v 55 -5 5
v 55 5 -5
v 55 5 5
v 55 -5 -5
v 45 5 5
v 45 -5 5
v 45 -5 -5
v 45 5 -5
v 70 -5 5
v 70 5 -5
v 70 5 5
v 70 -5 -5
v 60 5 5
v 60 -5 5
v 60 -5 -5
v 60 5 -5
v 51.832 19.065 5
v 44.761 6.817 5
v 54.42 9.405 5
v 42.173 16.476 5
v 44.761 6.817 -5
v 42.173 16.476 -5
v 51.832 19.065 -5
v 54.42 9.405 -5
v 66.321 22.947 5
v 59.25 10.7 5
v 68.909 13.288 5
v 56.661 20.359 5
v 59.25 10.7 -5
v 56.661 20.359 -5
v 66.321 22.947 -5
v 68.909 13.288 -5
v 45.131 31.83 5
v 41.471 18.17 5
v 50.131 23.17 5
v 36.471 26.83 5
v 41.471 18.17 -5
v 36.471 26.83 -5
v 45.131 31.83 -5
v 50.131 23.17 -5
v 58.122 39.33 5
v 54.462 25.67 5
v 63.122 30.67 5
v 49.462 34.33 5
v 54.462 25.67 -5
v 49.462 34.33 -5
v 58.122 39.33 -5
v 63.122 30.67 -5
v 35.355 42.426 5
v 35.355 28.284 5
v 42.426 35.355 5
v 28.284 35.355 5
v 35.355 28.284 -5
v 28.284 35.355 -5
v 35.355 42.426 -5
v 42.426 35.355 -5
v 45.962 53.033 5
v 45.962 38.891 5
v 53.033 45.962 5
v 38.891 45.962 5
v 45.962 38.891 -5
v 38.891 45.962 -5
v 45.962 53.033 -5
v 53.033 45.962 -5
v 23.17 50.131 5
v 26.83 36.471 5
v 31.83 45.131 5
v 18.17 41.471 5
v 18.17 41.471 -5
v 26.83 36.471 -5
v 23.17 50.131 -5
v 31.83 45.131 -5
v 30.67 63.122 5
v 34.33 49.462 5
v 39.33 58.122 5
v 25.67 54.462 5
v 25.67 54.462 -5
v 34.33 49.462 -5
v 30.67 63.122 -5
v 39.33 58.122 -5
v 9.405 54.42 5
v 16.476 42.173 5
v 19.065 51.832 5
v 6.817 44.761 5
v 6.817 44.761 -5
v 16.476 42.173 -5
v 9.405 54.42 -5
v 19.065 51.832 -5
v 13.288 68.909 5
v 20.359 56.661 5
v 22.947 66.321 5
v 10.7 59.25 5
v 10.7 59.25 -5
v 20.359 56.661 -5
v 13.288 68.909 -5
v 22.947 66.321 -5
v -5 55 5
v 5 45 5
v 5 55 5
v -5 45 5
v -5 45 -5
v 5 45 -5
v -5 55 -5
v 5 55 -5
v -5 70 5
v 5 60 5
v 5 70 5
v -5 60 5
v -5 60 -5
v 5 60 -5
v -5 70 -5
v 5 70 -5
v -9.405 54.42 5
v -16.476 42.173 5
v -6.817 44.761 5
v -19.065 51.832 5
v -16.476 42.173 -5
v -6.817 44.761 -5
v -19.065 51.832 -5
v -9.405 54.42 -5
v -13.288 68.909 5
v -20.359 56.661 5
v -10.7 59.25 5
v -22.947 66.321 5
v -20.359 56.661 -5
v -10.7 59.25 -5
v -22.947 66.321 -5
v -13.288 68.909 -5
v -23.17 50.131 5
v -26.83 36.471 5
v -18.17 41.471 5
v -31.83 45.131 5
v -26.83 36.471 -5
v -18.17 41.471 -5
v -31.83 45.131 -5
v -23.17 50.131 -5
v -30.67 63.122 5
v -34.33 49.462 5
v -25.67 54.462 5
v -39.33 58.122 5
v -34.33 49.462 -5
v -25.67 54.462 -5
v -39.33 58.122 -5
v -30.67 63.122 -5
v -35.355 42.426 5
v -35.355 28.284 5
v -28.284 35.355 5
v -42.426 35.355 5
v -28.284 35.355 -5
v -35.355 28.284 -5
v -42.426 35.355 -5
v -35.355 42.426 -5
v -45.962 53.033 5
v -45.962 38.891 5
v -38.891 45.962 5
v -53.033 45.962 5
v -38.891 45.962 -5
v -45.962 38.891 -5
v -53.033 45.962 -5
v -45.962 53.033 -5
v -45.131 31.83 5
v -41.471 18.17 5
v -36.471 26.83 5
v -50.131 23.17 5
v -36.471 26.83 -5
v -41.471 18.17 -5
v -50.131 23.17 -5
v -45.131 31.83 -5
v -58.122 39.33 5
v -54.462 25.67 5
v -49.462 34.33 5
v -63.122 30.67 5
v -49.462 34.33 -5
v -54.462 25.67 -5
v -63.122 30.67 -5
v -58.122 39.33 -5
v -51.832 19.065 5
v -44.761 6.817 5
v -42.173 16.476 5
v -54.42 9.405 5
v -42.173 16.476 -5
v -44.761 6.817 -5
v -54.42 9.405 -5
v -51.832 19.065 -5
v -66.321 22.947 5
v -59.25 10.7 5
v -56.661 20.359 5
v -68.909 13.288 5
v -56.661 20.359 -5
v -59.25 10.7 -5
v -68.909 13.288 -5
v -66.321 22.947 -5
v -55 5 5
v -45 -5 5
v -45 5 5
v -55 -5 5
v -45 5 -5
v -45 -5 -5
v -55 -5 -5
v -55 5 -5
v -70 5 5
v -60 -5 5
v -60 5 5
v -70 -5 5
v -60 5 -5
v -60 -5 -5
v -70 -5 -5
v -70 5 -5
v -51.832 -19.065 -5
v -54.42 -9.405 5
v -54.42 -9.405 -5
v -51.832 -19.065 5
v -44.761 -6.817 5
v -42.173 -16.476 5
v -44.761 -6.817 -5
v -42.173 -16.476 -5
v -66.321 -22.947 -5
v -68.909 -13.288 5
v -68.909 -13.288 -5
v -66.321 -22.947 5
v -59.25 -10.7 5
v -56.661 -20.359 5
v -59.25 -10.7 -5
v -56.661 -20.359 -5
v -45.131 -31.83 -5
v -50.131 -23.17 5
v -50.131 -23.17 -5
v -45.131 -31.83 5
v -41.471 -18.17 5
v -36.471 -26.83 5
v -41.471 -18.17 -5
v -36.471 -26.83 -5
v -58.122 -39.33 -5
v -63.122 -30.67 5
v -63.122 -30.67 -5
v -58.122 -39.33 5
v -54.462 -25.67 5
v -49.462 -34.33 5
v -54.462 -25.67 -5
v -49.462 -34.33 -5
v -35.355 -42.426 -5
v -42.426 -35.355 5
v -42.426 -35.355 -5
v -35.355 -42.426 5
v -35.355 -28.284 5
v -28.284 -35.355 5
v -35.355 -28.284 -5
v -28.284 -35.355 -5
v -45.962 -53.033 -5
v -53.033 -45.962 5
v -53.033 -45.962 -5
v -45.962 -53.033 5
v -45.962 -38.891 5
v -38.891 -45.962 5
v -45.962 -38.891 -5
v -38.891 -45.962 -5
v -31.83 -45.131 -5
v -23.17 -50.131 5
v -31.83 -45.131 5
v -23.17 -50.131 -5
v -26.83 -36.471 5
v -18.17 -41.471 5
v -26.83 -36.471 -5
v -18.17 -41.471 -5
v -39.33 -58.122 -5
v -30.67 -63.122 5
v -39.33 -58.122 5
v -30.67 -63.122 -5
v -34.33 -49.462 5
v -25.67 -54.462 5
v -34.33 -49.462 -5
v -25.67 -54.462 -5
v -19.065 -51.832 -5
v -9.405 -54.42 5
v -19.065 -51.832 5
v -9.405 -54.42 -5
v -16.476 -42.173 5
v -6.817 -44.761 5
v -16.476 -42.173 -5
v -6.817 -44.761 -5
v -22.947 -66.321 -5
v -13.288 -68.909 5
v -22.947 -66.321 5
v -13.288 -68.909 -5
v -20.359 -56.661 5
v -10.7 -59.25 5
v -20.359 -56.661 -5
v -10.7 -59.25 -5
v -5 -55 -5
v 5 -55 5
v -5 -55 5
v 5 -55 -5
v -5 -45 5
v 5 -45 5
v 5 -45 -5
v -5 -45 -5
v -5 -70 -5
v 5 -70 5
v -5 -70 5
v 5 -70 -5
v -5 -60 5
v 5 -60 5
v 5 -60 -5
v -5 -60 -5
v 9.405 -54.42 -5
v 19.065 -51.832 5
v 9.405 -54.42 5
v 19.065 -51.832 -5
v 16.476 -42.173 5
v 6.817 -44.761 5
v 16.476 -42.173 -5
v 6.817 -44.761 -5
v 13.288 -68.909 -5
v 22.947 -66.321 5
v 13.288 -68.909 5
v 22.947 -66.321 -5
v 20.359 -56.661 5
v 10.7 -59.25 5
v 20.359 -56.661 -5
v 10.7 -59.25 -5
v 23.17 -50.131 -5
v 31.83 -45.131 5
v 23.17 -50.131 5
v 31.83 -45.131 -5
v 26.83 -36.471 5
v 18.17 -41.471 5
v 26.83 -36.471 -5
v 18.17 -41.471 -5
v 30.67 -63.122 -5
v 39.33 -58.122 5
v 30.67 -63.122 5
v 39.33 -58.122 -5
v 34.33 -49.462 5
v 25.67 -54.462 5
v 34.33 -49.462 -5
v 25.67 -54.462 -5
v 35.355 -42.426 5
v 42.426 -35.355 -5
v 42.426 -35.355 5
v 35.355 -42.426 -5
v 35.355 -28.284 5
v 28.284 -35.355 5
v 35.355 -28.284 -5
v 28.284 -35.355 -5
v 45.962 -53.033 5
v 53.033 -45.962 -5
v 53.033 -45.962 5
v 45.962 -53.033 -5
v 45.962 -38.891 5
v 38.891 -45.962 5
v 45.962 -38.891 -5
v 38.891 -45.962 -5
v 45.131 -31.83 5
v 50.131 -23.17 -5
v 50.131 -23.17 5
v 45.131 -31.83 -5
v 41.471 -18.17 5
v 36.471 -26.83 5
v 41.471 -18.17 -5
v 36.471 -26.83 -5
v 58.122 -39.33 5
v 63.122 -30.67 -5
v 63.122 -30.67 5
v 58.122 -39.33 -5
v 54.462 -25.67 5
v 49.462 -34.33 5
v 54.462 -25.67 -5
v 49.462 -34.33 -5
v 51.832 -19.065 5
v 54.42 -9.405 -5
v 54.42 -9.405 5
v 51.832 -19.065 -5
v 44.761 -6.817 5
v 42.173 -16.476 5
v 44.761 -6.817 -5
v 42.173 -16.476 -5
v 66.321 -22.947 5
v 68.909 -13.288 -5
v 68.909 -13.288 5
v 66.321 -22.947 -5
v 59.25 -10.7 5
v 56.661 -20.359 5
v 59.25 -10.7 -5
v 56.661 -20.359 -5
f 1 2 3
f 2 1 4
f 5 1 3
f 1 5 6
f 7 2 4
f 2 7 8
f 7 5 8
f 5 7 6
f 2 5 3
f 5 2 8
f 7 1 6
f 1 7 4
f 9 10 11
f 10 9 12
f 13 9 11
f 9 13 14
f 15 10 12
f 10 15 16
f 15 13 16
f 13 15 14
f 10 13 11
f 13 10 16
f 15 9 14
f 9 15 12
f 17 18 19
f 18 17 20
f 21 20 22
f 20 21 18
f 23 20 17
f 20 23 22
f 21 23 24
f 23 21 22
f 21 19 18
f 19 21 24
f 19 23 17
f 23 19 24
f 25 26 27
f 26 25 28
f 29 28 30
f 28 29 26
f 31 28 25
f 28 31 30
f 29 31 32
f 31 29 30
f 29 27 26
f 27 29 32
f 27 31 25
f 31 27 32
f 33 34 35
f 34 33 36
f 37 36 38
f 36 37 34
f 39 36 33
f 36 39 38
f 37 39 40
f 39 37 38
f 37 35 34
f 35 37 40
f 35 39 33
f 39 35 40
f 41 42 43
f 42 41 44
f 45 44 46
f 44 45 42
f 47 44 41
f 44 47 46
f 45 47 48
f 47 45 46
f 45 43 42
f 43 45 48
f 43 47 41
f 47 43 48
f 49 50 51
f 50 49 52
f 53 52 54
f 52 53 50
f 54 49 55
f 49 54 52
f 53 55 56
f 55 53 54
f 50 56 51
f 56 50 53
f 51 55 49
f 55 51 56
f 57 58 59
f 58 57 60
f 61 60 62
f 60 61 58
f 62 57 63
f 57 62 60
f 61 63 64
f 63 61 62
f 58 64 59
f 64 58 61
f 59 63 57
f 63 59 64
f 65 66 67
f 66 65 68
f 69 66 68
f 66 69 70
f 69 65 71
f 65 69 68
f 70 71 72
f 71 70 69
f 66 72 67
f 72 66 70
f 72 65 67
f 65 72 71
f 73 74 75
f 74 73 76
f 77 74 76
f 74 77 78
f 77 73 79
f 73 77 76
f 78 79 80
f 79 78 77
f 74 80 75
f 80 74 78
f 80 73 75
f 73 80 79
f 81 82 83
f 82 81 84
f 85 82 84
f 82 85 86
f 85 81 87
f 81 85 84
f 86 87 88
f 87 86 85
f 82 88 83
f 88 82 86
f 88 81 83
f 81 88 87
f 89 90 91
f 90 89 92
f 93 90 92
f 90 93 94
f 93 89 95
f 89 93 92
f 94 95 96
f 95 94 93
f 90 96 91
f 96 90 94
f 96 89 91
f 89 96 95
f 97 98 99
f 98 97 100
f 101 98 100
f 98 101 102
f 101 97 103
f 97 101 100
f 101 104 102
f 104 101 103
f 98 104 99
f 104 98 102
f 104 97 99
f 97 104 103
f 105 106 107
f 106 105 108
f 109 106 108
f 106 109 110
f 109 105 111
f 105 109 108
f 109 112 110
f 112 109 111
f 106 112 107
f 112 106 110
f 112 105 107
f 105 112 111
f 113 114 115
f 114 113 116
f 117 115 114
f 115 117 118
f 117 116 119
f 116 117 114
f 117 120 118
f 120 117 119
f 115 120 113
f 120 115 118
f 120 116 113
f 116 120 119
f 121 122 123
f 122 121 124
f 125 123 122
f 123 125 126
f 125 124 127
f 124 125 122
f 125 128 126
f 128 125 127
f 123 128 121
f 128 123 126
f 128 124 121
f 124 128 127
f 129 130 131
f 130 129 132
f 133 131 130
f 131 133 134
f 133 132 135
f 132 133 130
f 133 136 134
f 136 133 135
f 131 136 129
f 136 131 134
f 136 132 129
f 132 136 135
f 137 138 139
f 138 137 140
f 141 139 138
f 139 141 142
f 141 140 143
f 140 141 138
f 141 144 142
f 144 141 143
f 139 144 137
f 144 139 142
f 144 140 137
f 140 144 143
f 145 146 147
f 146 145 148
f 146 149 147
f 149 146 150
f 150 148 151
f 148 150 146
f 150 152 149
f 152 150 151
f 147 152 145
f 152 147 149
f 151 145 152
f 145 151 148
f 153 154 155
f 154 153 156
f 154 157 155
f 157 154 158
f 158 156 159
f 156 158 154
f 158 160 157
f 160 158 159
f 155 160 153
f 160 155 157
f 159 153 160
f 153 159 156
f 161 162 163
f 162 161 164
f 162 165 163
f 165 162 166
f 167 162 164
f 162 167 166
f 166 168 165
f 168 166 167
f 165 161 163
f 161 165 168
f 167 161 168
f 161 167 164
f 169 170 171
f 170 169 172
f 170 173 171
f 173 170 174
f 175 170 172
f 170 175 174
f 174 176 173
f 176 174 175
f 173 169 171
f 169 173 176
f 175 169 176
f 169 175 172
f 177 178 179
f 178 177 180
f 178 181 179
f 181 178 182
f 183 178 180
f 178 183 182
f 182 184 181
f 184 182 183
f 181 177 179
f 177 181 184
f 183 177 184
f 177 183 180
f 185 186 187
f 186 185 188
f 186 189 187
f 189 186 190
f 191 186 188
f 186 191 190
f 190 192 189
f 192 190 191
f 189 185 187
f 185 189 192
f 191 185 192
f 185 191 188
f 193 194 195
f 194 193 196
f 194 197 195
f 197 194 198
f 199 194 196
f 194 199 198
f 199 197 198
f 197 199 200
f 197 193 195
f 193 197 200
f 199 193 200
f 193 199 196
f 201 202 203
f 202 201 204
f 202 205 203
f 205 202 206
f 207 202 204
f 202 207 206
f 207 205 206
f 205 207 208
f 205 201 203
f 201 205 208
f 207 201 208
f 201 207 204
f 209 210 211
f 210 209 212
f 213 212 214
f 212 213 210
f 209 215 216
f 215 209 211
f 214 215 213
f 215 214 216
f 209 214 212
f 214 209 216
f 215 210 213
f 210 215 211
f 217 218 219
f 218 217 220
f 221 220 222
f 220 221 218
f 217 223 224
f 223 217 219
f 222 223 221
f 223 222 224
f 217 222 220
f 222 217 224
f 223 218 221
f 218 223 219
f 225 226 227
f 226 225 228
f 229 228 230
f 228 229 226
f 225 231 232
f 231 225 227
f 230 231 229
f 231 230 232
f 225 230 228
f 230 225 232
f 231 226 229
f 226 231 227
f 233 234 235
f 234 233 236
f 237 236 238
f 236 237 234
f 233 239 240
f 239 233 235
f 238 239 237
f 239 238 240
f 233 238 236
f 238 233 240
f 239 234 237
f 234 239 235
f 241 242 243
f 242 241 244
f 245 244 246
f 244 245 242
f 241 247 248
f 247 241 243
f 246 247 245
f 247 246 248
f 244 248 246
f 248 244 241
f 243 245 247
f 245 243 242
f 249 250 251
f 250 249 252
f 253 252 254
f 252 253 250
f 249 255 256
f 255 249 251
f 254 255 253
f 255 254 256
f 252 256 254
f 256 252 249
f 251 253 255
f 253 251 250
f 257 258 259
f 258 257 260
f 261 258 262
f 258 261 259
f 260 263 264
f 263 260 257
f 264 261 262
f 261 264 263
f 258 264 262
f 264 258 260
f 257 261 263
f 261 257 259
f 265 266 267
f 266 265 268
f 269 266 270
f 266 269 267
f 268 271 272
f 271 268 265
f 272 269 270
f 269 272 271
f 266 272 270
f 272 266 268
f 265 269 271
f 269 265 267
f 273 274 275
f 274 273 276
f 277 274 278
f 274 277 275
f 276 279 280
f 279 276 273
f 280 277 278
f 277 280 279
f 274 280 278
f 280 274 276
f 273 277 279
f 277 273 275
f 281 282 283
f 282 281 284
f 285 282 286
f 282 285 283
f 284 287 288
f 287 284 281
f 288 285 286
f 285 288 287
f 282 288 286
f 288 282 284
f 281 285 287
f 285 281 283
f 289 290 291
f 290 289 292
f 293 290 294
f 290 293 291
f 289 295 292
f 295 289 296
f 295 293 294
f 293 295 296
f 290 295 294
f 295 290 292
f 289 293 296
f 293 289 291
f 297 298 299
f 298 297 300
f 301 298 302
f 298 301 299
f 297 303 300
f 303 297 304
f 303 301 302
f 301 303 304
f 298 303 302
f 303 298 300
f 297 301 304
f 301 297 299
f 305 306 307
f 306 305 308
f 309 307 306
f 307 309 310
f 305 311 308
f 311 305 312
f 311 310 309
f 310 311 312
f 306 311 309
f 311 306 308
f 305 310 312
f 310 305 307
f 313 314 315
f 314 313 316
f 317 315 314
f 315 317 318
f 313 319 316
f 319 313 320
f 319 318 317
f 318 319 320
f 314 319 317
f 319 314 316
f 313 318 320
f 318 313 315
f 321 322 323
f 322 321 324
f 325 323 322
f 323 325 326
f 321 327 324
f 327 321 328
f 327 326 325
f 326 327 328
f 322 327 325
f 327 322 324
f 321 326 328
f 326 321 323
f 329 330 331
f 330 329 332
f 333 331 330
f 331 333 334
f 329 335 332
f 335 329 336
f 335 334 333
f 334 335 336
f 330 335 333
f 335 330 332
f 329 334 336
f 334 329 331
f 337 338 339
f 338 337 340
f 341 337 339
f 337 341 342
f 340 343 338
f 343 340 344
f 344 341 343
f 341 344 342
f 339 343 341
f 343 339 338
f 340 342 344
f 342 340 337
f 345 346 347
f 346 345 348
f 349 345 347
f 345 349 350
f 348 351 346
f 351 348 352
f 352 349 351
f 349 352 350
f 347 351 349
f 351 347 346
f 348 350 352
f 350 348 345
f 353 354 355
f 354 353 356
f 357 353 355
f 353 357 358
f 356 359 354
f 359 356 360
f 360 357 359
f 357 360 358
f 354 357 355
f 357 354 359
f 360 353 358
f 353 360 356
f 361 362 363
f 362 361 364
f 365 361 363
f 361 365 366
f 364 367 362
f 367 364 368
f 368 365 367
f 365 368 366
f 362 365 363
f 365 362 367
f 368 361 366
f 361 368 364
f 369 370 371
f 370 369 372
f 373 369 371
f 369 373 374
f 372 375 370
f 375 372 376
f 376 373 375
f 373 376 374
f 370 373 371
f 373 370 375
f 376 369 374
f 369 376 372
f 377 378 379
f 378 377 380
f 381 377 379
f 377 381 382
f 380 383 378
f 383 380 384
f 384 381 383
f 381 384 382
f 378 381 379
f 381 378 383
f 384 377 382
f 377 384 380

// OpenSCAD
function hsv(h, s = 1, v = 1, a = 1, p, q, t) = (p == undef || q == undef || t == undef) // by LightAtPlay
	? hsv(
		(h%1) * 6,
		s<0?0:s>1?1:s,
		v<0?0:v>1?1:v,
		a,
		(v<0?0:v>1?1:v) * (1 - (s<0?0:s>1?1:s)),
		(v<0?0:v>1?1:v) * (1 - (s<0?0:s>1?1:s) * ((h%1)*6-floor((h%1)*6))),
		(v<0?0:v>1?1:v) * (1 - (s<0?0:s>1?1:s) * (1 - ((h%1)*6-floor((h%1)*6))))
	)
	:
	h < 1 ? [v,t,p,a] :
	h < 2 ? [q,v,p,a] :
	h < 3 ? [p,v,t,a] :
	h < 4 ? [p,q,v,a] :
	h < 5 ? [t,p,v,a] :
	        [v,p,q,a];

function hsv1(h, s, v) = hsv(h/360,s/100,v/100);

// dubois anaglyph shading
// (rl, gl, rl) is left image color
// (rr, gr, rr) is right image color

function dubois(rl, gl, bl, rr, gr, br) = [
  max(0, min(1, 0.4154*rl+0.4710*gl+0.1669*bl-0.0109*rr-0.0364*gr-0.0060*br)),
  max(0, min(1, -0.0458*rl-0.0484*gl-0.0257*bl+0.3756*rr+0.7333*gr+0.0111*br)),
  max(0, min(1, -0.0547*rl-0.0615*gl+0.0128*bl-0.0651*rr-0.1287*gr+1.2971*br))
];

function dubois1(c) = dubois(c[0], c[1], c[2], c[0], c[1], c[2]);

// color wheel
for (h = [0:15:360]) {
    // original color
    rotate([0, 0, h])
    translate([50,0,0])
    color(hsv1(h,100,100))
    cube(10, center=true);
    // dubois
    rotate([0, 0, h])
    translate([65,0,0])
    color(dubois1(hsv1(h,100,100)))
    cube(10, center=true);
}
